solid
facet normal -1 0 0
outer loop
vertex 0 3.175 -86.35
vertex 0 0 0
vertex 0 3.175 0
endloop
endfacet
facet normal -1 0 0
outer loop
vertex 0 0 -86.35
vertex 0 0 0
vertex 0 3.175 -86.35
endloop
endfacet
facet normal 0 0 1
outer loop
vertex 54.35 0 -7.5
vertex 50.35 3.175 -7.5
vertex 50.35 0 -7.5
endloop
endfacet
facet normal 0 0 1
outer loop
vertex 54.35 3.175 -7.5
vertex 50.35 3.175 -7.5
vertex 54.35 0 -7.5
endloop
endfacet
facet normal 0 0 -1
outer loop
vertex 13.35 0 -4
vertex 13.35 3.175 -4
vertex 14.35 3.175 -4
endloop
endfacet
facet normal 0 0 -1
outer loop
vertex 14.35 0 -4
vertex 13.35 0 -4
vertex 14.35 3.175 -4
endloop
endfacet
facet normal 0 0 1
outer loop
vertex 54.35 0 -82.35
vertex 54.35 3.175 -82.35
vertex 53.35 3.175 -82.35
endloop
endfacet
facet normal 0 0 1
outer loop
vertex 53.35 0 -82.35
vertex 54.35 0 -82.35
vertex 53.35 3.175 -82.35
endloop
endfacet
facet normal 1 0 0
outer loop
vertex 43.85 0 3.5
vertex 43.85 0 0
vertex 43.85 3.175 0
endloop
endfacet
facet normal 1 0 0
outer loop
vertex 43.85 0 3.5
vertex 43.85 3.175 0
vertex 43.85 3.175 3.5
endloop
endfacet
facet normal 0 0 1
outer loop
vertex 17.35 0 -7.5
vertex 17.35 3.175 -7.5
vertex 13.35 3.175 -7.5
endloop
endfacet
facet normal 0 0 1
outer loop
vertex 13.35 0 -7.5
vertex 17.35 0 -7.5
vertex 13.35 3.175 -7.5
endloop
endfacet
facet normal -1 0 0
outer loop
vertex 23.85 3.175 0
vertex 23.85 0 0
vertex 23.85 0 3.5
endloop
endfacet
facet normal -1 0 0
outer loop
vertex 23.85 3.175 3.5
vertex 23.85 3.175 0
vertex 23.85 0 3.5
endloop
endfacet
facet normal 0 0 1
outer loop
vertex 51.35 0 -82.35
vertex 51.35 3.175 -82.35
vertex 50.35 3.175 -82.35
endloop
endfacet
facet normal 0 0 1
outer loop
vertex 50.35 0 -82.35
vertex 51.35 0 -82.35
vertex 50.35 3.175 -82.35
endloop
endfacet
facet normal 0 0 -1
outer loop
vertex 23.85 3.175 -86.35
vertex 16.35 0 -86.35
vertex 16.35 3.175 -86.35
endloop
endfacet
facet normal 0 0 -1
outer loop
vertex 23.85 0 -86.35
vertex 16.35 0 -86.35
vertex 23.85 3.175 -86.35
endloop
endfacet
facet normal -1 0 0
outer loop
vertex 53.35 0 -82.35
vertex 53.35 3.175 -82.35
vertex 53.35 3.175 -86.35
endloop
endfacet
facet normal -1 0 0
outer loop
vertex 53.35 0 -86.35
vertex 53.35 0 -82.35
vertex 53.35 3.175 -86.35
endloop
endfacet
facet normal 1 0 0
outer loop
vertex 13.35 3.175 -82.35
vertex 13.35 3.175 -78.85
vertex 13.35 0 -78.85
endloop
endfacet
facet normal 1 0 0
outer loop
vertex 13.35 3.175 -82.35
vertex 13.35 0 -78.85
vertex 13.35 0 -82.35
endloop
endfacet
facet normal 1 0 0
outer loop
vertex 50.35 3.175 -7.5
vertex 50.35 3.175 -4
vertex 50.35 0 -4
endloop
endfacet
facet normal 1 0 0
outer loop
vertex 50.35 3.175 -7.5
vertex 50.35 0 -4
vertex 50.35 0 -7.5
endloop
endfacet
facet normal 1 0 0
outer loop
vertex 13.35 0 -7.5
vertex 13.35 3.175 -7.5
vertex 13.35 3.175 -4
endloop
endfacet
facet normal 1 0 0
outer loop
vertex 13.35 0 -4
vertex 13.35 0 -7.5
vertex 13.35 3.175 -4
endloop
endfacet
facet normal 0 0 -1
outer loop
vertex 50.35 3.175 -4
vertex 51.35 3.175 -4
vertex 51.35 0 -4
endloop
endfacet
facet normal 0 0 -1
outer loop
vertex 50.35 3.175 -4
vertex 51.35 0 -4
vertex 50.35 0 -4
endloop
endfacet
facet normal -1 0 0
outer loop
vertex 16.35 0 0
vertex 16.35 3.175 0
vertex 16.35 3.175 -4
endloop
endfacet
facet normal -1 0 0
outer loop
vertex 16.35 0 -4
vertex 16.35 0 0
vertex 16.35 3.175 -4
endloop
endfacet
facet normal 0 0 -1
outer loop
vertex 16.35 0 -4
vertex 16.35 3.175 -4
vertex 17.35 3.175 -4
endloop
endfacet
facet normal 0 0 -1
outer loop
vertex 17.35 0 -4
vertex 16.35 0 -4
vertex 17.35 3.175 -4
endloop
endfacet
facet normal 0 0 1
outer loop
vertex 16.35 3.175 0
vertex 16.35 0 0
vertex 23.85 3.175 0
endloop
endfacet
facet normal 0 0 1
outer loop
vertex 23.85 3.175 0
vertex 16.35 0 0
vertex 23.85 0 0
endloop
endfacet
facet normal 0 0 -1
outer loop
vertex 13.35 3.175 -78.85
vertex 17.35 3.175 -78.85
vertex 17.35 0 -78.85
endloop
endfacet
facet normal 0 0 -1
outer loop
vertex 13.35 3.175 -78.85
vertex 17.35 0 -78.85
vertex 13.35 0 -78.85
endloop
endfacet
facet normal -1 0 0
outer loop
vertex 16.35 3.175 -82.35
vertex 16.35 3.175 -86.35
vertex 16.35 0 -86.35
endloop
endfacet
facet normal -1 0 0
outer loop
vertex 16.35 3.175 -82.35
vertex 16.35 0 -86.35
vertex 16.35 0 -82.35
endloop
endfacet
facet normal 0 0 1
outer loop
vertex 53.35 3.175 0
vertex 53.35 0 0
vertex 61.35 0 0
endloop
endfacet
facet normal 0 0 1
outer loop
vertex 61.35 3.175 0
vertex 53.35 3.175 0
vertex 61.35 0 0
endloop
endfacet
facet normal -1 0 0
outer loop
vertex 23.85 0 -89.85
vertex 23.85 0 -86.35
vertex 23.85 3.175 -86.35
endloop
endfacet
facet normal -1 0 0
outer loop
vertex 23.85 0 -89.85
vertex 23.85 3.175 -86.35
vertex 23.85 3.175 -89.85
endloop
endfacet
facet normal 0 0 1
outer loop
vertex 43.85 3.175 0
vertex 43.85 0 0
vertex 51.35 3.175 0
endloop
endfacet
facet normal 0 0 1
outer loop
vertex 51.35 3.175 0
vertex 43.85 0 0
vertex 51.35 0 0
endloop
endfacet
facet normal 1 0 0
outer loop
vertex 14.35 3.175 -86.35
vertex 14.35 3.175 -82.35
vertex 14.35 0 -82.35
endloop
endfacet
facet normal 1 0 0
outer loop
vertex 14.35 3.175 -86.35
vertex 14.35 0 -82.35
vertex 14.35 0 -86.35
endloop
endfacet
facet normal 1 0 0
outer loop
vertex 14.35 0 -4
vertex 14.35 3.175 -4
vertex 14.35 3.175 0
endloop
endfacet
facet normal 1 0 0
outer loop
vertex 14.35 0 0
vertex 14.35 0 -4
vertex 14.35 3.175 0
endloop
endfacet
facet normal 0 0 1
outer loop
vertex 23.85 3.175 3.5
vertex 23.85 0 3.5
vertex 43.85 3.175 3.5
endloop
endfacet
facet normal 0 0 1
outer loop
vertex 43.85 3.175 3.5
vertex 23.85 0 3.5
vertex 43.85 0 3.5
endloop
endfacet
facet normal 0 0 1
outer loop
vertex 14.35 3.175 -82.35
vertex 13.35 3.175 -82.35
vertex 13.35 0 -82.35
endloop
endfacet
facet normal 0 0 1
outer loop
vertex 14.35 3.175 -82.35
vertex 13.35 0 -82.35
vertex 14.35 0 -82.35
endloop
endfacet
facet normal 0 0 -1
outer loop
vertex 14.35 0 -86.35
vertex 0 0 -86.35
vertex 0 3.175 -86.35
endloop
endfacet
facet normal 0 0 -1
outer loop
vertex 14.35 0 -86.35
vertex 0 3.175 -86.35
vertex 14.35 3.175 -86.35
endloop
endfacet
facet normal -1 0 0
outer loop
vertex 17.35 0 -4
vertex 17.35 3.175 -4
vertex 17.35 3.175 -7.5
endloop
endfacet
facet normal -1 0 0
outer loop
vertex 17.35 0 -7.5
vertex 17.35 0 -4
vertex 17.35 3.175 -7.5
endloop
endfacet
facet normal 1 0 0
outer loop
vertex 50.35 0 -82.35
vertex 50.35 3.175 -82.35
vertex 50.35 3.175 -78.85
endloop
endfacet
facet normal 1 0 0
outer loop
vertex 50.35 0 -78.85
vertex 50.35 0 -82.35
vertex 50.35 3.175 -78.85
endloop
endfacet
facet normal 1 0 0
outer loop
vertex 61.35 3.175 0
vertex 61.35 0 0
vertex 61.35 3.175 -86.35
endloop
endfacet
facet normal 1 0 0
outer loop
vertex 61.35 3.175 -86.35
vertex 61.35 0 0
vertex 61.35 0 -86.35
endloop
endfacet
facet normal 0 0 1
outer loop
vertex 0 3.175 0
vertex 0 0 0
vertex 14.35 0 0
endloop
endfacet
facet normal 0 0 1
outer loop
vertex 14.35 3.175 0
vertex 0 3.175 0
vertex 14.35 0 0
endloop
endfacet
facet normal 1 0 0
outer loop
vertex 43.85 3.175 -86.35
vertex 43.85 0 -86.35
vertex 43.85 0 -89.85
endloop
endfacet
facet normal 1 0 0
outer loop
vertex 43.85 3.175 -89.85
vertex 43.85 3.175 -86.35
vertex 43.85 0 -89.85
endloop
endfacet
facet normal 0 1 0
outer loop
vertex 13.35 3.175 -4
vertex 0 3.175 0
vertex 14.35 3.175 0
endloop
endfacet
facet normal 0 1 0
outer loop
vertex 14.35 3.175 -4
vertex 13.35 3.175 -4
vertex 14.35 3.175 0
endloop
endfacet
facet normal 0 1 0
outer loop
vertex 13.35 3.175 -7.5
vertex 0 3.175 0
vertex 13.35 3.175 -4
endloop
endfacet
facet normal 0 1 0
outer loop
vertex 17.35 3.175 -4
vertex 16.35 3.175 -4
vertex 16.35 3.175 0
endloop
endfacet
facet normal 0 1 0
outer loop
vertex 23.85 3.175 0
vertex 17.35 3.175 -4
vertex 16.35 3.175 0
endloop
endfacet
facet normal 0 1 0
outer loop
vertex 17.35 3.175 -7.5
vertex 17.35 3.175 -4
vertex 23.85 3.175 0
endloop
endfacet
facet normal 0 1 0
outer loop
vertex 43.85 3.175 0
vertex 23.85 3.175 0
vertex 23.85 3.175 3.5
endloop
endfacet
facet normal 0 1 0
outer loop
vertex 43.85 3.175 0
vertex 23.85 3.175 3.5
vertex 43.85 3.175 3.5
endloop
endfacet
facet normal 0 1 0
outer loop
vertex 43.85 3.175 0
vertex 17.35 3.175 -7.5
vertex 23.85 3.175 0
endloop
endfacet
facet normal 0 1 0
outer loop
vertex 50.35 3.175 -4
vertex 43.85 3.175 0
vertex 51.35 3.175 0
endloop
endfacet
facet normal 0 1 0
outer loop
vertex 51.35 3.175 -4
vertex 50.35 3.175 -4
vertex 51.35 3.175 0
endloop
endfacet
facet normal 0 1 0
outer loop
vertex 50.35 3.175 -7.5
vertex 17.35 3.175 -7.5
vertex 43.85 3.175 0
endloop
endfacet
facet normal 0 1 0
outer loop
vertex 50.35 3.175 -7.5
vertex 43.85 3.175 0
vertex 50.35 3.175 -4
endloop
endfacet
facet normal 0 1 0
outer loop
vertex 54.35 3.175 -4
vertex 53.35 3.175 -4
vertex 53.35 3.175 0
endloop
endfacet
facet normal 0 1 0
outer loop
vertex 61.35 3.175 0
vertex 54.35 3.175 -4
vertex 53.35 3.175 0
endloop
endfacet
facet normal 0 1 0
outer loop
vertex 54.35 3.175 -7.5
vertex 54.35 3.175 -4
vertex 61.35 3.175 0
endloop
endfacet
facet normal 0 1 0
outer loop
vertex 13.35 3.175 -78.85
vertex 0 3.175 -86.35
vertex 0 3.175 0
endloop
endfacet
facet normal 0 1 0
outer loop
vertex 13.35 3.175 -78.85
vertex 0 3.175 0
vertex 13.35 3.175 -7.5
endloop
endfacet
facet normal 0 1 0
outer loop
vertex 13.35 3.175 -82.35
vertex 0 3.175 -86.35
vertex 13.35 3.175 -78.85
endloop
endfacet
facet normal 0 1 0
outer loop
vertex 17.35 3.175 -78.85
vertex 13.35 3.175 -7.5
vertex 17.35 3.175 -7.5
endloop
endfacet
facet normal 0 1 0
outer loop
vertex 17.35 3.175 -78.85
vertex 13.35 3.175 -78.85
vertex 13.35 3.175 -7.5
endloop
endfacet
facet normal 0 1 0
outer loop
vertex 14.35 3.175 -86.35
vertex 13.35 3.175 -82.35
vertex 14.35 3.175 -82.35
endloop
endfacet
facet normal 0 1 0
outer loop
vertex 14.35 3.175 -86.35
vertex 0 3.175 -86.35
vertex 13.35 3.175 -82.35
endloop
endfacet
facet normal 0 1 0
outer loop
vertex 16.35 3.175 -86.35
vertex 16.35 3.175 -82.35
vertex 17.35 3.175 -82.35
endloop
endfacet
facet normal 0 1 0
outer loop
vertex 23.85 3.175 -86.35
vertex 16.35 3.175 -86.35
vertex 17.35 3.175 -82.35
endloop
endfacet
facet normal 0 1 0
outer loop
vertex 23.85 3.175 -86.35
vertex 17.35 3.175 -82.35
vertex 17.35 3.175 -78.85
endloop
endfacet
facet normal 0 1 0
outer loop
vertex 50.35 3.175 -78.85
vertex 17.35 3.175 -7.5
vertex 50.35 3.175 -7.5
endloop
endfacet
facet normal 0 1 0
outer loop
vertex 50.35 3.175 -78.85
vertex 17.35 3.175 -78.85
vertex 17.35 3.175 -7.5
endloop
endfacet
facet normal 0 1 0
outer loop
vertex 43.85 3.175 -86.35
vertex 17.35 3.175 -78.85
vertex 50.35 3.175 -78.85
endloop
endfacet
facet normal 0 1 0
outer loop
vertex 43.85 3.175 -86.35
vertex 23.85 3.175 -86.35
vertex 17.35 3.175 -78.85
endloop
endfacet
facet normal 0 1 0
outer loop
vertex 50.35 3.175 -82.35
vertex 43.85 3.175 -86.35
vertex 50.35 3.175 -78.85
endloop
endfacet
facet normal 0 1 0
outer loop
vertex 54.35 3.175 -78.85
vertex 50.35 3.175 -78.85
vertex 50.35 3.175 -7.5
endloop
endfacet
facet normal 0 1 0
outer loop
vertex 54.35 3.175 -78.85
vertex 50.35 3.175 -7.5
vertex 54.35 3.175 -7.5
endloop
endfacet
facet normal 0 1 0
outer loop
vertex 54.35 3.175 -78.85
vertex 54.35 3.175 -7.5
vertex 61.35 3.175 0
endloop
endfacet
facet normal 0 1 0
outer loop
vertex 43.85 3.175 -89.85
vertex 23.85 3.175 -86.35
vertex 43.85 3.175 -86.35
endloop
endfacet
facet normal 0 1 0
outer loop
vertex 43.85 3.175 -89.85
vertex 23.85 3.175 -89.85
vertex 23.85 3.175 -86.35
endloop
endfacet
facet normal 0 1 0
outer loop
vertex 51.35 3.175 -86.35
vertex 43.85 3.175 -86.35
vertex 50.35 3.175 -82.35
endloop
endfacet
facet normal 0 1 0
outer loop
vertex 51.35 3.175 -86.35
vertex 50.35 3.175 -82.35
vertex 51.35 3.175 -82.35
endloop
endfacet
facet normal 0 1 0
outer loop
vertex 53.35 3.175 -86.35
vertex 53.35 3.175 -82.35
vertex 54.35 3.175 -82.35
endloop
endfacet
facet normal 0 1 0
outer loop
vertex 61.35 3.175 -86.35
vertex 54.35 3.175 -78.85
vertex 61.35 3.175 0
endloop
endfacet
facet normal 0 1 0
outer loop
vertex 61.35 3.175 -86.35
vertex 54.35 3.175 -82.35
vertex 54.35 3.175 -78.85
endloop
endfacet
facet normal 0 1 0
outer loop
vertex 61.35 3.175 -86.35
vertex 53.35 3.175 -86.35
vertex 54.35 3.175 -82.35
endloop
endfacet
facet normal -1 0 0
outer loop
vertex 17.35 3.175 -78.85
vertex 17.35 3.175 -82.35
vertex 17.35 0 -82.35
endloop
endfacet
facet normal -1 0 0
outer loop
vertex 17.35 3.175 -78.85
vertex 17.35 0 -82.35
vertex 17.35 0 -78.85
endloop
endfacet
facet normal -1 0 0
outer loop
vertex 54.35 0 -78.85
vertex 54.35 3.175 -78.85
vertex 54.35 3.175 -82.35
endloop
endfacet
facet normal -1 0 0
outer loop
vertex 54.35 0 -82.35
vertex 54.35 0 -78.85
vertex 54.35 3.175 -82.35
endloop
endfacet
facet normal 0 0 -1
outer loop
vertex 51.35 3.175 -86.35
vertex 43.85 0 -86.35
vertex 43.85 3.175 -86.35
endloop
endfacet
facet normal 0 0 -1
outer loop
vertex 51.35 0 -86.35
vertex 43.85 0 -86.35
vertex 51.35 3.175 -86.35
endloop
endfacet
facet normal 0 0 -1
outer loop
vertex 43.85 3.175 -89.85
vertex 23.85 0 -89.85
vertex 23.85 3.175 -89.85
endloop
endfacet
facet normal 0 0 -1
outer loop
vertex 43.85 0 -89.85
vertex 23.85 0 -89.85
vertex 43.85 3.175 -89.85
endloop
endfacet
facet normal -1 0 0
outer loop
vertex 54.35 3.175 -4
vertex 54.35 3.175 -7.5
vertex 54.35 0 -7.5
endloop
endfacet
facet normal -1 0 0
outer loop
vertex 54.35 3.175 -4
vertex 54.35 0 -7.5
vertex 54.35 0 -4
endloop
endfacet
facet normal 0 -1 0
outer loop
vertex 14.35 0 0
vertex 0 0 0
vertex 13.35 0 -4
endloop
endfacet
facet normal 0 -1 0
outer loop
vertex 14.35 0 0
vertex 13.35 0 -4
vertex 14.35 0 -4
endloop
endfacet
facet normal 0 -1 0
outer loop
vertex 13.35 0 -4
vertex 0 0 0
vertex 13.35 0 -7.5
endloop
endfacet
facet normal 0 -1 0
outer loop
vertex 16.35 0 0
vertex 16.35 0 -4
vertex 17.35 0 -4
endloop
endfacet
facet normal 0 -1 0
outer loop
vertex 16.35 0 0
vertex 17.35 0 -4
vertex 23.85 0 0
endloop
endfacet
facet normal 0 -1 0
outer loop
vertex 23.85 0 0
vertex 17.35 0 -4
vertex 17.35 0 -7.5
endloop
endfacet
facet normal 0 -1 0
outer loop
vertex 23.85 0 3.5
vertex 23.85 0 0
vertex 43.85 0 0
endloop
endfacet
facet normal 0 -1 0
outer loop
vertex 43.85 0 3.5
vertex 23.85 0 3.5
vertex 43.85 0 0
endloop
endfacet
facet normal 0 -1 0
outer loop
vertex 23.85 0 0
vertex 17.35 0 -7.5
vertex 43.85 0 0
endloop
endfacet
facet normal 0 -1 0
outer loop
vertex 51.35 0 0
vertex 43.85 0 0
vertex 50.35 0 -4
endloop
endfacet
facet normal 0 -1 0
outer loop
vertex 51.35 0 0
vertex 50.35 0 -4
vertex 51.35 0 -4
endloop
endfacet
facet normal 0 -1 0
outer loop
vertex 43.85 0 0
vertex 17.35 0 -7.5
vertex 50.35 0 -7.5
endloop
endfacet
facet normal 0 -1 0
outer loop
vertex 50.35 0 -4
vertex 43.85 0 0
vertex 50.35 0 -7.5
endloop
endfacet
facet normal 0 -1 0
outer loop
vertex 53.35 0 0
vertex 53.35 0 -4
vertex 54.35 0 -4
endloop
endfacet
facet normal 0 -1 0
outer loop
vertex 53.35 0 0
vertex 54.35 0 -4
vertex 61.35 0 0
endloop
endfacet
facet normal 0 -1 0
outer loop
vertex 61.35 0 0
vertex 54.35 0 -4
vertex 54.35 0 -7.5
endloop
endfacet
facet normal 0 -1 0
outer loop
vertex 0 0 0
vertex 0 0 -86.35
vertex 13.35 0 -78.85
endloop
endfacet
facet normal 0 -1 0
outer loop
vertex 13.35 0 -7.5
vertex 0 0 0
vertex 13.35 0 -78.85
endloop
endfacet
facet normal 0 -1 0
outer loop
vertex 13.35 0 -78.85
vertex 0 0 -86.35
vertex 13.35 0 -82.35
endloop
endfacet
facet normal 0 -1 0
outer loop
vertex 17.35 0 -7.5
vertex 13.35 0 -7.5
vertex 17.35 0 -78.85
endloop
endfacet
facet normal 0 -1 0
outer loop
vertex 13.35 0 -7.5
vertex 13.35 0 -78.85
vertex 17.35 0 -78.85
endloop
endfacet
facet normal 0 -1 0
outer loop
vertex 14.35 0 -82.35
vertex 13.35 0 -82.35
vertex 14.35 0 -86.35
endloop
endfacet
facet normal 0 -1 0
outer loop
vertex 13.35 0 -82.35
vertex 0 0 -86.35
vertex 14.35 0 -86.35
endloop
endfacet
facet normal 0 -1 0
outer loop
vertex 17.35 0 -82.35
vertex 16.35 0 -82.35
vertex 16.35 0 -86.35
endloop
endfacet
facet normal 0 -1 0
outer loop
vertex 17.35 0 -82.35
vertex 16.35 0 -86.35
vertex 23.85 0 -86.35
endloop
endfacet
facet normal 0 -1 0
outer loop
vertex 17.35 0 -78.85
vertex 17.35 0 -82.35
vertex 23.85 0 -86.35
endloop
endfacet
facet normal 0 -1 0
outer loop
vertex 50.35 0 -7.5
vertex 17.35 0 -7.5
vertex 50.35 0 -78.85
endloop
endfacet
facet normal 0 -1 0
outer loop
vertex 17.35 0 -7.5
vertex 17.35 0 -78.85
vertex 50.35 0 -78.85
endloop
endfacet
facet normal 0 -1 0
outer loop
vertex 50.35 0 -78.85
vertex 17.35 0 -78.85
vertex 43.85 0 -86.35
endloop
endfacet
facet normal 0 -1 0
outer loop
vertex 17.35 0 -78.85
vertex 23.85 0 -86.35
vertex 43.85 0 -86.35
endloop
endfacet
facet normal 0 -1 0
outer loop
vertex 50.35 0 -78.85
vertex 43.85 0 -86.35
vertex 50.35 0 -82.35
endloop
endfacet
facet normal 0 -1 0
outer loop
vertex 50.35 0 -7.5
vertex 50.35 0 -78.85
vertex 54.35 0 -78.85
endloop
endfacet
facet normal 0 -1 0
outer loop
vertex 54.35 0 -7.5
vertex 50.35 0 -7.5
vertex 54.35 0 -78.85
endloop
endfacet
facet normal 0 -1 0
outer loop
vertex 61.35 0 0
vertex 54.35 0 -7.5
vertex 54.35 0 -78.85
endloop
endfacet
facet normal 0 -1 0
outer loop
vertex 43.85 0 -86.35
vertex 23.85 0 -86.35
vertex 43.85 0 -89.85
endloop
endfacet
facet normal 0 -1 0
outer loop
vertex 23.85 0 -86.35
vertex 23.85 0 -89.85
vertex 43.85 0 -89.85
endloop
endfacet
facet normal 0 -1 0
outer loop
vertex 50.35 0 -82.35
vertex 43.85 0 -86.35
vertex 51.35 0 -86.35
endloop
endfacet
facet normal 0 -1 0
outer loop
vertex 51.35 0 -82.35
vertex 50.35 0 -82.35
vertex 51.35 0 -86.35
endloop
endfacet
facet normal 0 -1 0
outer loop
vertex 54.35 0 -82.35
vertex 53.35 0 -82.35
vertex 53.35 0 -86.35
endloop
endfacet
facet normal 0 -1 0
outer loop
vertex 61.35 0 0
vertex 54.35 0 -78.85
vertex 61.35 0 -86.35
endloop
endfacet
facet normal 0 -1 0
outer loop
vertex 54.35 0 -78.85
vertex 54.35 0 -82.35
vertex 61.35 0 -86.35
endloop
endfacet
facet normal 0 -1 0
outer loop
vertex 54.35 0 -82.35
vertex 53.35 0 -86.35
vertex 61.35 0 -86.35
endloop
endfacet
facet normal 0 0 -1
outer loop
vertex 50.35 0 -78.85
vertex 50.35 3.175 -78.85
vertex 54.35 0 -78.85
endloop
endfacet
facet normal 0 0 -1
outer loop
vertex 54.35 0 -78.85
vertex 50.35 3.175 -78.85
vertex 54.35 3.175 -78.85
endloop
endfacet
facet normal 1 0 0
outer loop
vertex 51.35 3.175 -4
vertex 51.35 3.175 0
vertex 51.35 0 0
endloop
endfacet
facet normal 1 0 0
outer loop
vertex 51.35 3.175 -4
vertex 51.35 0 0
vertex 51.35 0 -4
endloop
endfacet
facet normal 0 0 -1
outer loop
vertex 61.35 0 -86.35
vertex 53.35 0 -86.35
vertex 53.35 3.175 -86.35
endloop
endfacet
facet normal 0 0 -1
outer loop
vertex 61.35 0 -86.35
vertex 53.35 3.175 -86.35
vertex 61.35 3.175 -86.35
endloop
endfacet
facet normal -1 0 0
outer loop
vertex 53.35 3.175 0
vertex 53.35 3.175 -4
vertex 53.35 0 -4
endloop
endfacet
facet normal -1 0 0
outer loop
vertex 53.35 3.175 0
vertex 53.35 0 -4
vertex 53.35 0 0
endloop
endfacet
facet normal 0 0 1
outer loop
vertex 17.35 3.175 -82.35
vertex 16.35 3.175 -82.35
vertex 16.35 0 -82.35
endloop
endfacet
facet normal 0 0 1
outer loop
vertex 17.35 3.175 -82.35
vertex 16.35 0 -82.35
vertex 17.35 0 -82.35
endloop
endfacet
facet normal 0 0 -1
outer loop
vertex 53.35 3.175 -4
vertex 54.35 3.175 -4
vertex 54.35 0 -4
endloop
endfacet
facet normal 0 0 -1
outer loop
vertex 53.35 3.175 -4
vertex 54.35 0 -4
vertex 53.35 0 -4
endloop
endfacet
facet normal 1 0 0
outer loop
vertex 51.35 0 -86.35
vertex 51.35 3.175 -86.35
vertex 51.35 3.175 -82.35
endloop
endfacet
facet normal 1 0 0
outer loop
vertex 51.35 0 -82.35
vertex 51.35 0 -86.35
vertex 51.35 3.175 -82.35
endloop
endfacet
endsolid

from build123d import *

# Parameters (mm, degrees)
SKETCH1_W            = 61.35
SKETCH1_H            = 86.35
BOSS_EXTRUDE1_DEPTH  = 3.175
SKETCH2_W            = 20
SKETCH2_H            = 3.5
BOSS_EXTRUDE2_DEPTH  = 3.175
CUT_EXTRUDE1_DEPTH   = 3.175
MIRROR2_COPY_1_DEPTH = 3.175


with BuildPart() as part:
    # Sketch1 → Boss-Extrude1 (new body)
    with BuildSketch(Plane(origin=(0, 0, 0), x_dir=(1, 0, 0), z_dir=(0, 1, 0))):
        with Locations((30.675, 43.175)):
            Rectangle(SKETCH1_W, SKETCH1_H)
    extrude(amount=BOSS_EXTRUDE1_DEPTH)

    # Sketch2 → Boss-Extrude2 (add)
    with BuildSketch(Plane.XZ):
        with Locations((33.85, 1.75)):
            Rectangle(SKETCH2_W, SKETCH2_H)
    boss_extrude2 = extrude(amount=-BOSS_EXTRUDE2_DEPTH)

    # Sketch3 → Cut-Extrude1 (cut)
    with BuildSketch(Plane(origin=(0, 3.175, 0), x_dir=(1, 0, 0), z_dir=(0, 1, 0))):
        Polygon((16.35, 0), (16.35, 4), (17.35, 4), (17.35, 7.5), (13.35, 7.5), (13.35, 4), (14.35, 4), (14.35, 0), align=None)
    cut_extrude1 = extrude(amount=-CUT_EXTRUDE1_DEPTH, mode=Mode.SUBTRACT)

    # Mirror1: Cut-Extrude1 across plane
    add(cut_extrude1.mirror(Plane(origin=(33.85, 0, 0), x_dir=(0, 0, 1), z_dir=(1, 0, 0))), mode=Mode.SUBTRACT)

    # Mirror2: Boss-Extrude2, Cut-Extrude1 across plane
    add(boss_extrude2.mirror(Plane.XY.offset(-43.175)))
    add(cut_extrude1.mirror(Plane.XY.offset(-43.175)), mode=Mode.SUBTRACT)

    # Mirror2 copy 1 sketch → Mirror2 copy 1 (cut)
    with BuildSketch(Plane(origin=(67.7, 3.175, -86.35), x_dir=(-1, 0, 0), z_dir=(0, 1, 0))):
        Polygon((16.35, 0), (16.35, 4), (17.35, 4), (17.35, 7.5), (13.35, 7.5), (13.35, 4), (14.35, 4), (14.35, 0), align=None)
    extrude(amount=-MIRROR2_COPY_1_DEPTH, mode=Mode.SUBTRACT)


solid = part.part
